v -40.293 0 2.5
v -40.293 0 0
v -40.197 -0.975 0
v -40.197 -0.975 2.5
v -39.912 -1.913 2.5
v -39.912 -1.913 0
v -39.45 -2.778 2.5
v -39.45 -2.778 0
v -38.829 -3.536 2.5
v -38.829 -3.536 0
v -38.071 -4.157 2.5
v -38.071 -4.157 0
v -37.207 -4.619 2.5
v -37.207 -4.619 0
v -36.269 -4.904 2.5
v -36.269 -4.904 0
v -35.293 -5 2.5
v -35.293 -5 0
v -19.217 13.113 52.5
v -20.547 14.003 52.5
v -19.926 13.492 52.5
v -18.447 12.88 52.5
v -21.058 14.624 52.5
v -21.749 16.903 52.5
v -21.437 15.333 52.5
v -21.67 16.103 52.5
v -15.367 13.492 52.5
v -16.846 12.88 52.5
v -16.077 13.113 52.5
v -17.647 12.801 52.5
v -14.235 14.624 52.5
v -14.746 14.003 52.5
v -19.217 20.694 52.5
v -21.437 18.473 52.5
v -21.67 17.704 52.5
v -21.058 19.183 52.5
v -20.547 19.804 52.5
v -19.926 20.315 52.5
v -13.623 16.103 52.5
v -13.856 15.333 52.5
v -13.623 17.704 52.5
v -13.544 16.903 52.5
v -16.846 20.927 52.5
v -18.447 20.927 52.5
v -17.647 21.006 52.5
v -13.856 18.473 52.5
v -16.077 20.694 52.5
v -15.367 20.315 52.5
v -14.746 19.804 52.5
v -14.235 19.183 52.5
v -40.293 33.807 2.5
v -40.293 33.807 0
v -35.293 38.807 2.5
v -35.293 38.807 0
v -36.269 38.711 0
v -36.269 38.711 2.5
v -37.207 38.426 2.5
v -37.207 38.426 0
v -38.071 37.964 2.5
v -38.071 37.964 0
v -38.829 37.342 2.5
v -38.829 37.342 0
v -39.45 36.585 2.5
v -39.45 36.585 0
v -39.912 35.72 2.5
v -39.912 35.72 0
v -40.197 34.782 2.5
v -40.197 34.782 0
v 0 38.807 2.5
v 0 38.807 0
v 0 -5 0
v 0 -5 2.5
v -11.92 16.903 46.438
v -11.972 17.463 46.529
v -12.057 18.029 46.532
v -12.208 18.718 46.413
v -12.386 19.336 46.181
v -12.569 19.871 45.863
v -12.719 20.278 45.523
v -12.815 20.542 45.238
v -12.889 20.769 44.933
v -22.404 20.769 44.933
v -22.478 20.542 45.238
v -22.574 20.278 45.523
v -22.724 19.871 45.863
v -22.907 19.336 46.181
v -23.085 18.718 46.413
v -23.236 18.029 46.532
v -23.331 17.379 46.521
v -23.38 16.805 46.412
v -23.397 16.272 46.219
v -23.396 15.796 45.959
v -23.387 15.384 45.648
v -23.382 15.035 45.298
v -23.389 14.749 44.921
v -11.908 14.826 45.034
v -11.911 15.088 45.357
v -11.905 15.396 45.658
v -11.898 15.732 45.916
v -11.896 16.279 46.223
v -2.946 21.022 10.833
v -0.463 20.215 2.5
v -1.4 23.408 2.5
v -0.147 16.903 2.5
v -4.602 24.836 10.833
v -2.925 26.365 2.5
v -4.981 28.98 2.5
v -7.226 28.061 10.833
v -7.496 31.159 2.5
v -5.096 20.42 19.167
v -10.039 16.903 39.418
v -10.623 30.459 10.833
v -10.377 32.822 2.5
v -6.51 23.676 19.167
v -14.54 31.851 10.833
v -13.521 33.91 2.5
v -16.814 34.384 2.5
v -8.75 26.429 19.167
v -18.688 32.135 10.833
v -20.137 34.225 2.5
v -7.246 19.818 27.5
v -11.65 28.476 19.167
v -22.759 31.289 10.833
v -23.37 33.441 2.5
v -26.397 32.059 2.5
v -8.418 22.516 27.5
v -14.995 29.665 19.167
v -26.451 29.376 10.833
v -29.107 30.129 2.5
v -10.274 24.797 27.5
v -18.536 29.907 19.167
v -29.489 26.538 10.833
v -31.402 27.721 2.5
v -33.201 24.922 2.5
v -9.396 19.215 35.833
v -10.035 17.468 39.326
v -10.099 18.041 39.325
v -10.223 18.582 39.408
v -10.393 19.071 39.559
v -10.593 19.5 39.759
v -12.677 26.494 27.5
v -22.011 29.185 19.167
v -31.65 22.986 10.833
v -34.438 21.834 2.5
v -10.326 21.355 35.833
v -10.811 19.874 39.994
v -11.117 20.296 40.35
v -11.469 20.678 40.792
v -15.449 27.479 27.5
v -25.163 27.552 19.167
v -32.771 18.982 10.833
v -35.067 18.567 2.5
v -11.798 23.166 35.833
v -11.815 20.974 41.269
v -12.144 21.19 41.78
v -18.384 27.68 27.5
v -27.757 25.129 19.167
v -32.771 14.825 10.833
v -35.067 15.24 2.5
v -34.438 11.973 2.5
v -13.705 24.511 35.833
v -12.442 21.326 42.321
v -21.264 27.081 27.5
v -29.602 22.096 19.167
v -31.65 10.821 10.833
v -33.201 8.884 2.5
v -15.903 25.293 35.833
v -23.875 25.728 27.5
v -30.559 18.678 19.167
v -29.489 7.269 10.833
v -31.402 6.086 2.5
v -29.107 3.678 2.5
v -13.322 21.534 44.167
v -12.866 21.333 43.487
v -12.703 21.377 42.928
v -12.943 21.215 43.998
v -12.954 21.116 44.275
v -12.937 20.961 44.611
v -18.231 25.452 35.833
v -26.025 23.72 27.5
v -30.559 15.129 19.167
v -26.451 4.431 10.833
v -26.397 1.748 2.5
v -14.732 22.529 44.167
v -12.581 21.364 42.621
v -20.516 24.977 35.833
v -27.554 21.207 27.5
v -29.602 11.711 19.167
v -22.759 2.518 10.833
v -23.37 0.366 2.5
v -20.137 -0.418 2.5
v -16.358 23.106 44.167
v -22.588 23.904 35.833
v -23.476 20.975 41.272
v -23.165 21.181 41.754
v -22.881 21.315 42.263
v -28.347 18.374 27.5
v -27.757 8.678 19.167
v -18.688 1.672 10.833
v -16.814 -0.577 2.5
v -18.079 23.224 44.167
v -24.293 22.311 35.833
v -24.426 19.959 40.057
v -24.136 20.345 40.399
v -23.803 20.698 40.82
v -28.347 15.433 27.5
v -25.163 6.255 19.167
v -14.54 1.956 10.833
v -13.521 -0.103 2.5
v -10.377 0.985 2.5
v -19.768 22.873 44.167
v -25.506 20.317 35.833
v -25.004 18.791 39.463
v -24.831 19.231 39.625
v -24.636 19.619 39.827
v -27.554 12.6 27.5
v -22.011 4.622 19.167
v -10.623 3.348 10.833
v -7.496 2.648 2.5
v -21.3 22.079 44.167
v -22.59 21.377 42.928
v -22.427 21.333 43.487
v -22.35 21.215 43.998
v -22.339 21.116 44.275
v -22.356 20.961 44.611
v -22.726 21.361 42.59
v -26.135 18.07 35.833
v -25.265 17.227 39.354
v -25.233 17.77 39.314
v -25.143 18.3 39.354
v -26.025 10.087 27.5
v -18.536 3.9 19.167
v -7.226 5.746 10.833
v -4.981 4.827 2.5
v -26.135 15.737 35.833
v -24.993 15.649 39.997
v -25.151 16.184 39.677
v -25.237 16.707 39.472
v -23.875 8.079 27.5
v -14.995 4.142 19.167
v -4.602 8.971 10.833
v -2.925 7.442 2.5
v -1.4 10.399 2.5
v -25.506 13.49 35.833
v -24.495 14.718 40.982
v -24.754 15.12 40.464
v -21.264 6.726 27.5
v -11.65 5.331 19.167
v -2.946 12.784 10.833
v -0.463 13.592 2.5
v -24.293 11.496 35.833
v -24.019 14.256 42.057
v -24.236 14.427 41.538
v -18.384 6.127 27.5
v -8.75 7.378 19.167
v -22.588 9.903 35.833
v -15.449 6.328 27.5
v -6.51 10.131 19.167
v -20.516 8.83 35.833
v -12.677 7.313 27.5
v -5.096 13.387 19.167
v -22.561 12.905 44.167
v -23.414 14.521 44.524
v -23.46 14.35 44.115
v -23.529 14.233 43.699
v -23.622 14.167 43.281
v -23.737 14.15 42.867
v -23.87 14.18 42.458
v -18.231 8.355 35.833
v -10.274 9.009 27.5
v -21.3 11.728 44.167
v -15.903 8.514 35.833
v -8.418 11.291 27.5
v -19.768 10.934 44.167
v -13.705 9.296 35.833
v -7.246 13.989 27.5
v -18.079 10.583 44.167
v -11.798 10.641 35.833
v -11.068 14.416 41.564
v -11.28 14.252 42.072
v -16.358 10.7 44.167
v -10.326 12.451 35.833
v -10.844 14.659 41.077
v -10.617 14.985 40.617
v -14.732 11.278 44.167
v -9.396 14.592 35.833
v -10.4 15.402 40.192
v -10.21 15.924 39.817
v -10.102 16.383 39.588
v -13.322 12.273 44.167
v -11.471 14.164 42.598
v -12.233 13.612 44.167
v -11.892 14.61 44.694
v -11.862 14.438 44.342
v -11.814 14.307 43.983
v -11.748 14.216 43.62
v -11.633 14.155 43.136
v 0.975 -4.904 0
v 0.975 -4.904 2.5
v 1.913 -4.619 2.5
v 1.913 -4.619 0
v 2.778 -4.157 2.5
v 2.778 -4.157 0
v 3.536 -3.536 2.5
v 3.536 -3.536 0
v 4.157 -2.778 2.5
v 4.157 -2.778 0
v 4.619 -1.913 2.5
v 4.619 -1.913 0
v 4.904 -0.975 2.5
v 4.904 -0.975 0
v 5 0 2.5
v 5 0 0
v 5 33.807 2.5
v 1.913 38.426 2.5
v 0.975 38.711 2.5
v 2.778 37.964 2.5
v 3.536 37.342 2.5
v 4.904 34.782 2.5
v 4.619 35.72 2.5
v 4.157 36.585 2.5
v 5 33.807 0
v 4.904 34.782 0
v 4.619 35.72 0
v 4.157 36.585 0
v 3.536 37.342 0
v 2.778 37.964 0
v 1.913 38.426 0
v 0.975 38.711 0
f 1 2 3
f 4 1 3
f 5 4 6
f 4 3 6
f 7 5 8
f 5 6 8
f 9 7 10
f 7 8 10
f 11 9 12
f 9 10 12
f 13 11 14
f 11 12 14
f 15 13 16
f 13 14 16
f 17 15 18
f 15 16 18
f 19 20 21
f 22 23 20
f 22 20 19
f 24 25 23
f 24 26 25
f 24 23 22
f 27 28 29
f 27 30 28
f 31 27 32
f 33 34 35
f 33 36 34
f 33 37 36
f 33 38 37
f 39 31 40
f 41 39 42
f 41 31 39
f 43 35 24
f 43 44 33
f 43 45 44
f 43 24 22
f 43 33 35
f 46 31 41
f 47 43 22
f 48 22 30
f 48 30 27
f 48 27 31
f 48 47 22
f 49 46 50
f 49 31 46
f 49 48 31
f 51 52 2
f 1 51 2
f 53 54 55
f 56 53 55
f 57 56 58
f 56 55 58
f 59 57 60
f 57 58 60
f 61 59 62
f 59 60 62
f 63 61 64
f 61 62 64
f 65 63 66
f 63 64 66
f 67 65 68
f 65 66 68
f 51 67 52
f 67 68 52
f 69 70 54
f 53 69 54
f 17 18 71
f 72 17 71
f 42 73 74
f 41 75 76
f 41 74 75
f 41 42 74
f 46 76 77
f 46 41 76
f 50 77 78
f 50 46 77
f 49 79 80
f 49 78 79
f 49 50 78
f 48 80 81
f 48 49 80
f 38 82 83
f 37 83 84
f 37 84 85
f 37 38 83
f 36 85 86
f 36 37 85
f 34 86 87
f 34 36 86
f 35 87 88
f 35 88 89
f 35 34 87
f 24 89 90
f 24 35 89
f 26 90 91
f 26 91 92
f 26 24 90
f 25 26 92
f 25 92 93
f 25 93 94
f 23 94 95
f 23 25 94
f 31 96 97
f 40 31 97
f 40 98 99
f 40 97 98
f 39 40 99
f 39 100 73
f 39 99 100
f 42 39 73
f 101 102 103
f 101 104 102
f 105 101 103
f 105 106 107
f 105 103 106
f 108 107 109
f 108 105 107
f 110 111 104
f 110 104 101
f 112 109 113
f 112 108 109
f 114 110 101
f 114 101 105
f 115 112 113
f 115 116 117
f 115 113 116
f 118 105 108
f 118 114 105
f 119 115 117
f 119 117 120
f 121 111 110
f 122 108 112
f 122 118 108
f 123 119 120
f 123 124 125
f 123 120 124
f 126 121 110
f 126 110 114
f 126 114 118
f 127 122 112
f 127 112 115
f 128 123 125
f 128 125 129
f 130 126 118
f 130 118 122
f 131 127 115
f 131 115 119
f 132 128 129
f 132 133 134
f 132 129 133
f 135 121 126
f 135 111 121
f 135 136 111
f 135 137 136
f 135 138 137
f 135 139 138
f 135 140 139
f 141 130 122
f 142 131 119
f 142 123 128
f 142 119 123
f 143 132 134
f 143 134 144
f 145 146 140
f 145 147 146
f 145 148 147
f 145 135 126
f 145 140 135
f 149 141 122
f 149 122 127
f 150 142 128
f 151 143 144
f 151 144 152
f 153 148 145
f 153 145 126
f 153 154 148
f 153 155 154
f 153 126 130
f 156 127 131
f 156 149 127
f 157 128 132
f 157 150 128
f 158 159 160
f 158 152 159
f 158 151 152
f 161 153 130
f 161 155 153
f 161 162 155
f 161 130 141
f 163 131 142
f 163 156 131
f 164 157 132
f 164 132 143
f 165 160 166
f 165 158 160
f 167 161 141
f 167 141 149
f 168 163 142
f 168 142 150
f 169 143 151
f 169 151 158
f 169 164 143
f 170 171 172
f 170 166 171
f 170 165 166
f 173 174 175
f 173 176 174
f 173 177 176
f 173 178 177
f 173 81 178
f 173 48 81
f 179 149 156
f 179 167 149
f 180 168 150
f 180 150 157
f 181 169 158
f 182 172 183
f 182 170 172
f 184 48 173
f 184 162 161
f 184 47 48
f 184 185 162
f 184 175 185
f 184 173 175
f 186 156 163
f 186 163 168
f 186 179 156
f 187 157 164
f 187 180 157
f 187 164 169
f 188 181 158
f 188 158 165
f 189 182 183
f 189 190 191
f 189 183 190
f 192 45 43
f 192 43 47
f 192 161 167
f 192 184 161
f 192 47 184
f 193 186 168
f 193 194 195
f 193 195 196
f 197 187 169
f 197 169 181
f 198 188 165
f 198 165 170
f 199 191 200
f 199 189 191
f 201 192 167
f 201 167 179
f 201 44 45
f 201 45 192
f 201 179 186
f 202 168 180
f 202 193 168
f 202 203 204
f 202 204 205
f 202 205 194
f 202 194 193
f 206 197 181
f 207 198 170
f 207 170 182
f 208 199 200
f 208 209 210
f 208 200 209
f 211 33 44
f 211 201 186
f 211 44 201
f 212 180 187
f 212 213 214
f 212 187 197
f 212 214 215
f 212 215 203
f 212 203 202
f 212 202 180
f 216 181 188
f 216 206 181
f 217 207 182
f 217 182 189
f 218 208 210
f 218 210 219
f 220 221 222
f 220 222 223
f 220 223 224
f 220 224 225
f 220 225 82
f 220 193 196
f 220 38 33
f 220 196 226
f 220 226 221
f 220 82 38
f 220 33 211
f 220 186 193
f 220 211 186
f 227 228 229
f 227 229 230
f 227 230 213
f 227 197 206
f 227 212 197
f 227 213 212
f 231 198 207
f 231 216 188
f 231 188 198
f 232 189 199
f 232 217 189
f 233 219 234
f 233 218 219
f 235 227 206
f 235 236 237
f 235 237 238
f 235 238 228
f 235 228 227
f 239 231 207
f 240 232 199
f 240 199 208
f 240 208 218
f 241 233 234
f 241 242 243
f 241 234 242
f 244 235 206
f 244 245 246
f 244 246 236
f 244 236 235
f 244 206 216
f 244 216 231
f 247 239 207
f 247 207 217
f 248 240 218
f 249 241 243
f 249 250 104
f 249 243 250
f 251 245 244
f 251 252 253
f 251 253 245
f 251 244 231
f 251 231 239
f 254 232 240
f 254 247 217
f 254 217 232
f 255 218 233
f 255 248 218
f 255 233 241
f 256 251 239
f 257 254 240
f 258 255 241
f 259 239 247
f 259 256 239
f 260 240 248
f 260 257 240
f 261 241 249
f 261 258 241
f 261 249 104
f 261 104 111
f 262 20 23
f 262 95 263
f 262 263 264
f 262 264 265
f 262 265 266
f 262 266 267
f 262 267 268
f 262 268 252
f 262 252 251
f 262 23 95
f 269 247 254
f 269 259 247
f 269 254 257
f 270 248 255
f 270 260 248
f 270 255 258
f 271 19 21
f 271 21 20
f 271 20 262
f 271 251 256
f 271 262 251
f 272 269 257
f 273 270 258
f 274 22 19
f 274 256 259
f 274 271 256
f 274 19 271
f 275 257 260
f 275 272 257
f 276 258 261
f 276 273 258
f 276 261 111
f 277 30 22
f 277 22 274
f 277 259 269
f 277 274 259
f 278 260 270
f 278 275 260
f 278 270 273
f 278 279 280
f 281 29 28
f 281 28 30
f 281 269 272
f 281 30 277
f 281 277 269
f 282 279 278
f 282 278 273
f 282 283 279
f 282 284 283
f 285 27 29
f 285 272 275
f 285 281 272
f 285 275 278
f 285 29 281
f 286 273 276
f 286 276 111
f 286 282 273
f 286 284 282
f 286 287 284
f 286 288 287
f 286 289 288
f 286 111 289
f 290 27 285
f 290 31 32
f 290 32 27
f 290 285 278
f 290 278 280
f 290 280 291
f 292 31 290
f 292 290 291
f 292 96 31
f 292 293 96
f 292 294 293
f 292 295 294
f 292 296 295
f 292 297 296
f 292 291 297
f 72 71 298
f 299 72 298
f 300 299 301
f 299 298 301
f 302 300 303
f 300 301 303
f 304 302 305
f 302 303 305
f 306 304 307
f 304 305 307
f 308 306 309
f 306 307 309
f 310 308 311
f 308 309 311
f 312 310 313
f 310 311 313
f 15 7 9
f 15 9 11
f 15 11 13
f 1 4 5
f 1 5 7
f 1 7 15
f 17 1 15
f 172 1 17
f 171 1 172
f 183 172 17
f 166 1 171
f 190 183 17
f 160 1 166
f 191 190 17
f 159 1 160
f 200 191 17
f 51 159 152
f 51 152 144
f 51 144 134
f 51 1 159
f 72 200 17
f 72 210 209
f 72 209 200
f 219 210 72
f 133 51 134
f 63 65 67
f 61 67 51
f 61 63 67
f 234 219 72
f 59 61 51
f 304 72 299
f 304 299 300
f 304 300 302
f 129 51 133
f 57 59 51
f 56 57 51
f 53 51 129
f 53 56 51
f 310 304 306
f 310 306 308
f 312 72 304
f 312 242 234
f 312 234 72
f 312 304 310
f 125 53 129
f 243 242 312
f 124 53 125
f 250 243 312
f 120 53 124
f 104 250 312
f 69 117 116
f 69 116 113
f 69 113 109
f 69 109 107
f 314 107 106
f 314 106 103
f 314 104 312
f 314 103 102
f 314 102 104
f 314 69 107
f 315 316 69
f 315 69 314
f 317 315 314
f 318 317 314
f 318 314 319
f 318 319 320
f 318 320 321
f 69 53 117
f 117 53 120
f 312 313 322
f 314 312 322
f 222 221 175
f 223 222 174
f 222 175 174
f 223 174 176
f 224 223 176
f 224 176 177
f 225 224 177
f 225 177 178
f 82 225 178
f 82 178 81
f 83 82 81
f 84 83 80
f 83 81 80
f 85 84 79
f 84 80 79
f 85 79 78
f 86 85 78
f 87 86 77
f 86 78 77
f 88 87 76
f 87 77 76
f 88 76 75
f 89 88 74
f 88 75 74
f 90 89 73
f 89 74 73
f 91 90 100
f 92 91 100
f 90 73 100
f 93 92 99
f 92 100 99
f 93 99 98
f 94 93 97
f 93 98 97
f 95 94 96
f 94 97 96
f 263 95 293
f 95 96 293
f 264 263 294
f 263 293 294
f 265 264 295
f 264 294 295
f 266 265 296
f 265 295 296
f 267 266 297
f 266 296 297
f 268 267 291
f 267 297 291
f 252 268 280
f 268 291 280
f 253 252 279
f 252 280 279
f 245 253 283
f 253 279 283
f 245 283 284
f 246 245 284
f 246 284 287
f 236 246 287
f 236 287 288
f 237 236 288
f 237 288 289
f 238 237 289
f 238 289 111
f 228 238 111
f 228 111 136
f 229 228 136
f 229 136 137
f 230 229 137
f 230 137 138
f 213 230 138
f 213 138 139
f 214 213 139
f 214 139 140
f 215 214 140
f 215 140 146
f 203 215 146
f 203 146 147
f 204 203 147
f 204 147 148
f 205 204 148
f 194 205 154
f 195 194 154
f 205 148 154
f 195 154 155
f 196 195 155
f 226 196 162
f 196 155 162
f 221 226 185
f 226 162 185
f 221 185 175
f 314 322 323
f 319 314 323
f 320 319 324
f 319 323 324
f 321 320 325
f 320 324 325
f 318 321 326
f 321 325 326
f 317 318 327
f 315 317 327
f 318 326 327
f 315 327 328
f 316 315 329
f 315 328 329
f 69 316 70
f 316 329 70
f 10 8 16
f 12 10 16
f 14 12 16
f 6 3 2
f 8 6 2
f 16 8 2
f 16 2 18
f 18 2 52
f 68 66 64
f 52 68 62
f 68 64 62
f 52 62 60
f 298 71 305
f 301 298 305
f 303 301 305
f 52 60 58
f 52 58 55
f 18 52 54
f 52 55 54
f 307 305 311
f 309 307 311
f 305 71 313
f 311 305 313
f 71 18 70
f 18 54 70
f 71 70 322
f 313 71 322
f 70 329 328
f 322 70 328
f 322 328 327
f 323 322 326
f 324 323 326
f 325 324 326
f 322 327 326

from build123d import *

# Parameters (mm, degrees)
F0_R     = 17.5
F1_DEPTH = 2.5
F2_R     = 17.5
F3_DEPTH = 50
F3_TAPER = 15
F4_R     = 3.6137849114
F5_DEPTH = 60


with BuildPart() as f1:
    # F0 (on Top) → F1 (new body)
    with BuildSketch(Plane.XY):
        with BuildLine():
            Line((0, 38.8068709316), (-35.2930977718, 38.8068709316))
            ThreePointArc((-35.2930977718, 38.8068709316), (-38.8286316778, 37.3424048375), (-40.2930977718, 33.8068709316))
            Line((-40.2930977718, 33.8068709316), (-40.2930977718, 0))
            ThreePointArc((-40.2930977718, 0), (-38.8286316778, -3.5355339059), (-35.2930977718, -5))
            Line((-35.2930977718, -5), (0, -5))
            ThreePointArc((0, -5), (3.5355339059, -3.5355339059), (5, 0))
            Line((5, 0), (5, 33.8068709316))
            ThreePointArc((5, 33.8068709316), (3.5355339059, 37.3424048375), (0, 38.8068709316))
        make_face()
        with Locations((-17.6465488859, 16.9034354658)):
            Circle(F0_R, mode=Mode.SUBTRACT)
        with Locations((-17.6465488859, 16.9034354658)):
            Circle(F0_R)
    extrude(amount=F1_DEPTH)

    # F2 (on face) → F3 (join)
    with BuildSketch(Plane.XY.offset(2.5)):
        with Locations((-17.6465488859, 16.9034354658)):
            Circle(F2_R)
    extrude(amount=F3_DEPTH, taper=F3_TAPER)

    # F4 (on Right) → F5 (cut)
    with BuildSketch(Plane.YZ):
        with Locations((17.7631601691, 42.927633971)):
            Circle(F4_R)
    extrude(amount=-F5_DEPTH, mode=Mode.SUBTRACT)


solid = f1.part
